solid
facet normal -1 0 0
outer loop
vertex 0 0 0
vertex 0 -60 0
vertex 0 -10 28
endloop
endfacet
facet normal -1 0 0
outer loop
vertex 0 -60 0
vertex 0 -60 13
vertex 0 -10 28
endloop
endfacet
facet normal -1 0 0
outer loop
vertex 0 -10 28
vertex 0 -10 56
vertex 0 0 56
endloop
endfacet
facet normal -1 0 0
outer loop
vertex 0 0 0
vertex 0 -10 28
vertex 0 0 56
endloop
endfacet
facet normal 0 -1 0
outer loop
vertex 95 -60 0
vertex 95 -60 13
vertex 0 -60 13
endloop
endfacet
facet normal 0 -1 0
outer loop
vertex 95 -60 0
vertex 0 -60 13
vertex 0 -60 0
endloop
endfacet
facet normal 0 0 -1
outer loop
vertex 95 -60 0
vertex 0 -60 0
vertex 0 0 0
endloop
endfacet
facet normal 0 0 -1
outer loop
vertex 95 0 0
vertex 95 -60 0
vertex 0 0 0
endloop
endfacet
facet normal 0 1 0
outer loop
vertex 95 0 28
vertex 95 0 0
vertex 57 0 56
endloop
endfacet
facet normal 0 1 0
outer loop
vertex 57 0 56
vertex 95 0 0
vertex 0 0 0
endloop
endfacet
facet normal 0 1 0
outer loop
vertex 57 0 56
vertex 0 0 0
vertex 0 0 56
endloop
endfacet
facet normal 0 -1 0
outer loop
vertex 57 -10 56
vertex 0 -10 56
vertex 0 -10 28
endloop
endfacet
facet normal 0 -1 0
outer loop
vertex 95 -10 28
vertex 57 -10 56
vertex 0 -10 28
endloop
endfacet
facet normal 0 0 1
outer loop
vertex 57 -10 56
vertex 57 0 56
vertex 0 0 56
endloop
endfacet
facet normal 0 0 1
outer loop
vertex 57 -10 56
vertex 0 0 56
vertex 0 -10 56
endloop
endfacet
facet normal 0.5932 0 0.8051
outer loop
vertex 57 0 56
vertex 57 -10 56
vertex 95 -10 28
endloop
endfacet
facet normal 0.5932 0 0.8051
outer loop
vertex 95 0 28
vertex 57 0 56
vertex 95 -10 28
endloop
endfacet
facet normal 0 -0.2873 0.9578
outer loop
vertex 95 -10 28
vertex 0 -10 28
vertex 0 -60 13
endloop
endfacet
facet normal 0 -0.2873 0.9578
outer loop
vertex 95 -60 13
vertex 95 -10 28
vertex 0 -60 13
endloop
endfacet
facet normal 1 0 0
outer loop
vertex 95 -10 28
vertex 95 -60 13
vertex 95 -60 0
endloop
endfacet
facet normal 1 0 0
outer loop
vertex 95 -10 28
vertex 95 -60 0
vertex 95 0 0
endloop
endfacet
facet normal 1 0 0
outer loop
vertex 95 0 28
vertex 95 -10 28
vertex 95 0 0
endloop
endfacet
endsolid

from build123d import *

# Parameters (mm, degrees)
F1_DEPTH = 95
F3_DEPTH = 25


with BuildPart() as f1:
    # F0 (on Right) → F1 (new body)
    with BuildSketch(Plane.YZ):
        Polygon((-60, 0), (0, 0), (0, 56), (-10, 56), (-10, 28), (-60, 13), align=None)
    extrude(amount=F1_DEPTH)

    # F2 (on face) → F3 (cut)
    with BuildSketch(Plane.XZ.offset(10)):
        Polygon((95, 56), (57, 56), (95, 28), align=None)
    extrude(amount=-F3_DEPTH, mode=Mode.SUBTRACT)


solid = f1.part
